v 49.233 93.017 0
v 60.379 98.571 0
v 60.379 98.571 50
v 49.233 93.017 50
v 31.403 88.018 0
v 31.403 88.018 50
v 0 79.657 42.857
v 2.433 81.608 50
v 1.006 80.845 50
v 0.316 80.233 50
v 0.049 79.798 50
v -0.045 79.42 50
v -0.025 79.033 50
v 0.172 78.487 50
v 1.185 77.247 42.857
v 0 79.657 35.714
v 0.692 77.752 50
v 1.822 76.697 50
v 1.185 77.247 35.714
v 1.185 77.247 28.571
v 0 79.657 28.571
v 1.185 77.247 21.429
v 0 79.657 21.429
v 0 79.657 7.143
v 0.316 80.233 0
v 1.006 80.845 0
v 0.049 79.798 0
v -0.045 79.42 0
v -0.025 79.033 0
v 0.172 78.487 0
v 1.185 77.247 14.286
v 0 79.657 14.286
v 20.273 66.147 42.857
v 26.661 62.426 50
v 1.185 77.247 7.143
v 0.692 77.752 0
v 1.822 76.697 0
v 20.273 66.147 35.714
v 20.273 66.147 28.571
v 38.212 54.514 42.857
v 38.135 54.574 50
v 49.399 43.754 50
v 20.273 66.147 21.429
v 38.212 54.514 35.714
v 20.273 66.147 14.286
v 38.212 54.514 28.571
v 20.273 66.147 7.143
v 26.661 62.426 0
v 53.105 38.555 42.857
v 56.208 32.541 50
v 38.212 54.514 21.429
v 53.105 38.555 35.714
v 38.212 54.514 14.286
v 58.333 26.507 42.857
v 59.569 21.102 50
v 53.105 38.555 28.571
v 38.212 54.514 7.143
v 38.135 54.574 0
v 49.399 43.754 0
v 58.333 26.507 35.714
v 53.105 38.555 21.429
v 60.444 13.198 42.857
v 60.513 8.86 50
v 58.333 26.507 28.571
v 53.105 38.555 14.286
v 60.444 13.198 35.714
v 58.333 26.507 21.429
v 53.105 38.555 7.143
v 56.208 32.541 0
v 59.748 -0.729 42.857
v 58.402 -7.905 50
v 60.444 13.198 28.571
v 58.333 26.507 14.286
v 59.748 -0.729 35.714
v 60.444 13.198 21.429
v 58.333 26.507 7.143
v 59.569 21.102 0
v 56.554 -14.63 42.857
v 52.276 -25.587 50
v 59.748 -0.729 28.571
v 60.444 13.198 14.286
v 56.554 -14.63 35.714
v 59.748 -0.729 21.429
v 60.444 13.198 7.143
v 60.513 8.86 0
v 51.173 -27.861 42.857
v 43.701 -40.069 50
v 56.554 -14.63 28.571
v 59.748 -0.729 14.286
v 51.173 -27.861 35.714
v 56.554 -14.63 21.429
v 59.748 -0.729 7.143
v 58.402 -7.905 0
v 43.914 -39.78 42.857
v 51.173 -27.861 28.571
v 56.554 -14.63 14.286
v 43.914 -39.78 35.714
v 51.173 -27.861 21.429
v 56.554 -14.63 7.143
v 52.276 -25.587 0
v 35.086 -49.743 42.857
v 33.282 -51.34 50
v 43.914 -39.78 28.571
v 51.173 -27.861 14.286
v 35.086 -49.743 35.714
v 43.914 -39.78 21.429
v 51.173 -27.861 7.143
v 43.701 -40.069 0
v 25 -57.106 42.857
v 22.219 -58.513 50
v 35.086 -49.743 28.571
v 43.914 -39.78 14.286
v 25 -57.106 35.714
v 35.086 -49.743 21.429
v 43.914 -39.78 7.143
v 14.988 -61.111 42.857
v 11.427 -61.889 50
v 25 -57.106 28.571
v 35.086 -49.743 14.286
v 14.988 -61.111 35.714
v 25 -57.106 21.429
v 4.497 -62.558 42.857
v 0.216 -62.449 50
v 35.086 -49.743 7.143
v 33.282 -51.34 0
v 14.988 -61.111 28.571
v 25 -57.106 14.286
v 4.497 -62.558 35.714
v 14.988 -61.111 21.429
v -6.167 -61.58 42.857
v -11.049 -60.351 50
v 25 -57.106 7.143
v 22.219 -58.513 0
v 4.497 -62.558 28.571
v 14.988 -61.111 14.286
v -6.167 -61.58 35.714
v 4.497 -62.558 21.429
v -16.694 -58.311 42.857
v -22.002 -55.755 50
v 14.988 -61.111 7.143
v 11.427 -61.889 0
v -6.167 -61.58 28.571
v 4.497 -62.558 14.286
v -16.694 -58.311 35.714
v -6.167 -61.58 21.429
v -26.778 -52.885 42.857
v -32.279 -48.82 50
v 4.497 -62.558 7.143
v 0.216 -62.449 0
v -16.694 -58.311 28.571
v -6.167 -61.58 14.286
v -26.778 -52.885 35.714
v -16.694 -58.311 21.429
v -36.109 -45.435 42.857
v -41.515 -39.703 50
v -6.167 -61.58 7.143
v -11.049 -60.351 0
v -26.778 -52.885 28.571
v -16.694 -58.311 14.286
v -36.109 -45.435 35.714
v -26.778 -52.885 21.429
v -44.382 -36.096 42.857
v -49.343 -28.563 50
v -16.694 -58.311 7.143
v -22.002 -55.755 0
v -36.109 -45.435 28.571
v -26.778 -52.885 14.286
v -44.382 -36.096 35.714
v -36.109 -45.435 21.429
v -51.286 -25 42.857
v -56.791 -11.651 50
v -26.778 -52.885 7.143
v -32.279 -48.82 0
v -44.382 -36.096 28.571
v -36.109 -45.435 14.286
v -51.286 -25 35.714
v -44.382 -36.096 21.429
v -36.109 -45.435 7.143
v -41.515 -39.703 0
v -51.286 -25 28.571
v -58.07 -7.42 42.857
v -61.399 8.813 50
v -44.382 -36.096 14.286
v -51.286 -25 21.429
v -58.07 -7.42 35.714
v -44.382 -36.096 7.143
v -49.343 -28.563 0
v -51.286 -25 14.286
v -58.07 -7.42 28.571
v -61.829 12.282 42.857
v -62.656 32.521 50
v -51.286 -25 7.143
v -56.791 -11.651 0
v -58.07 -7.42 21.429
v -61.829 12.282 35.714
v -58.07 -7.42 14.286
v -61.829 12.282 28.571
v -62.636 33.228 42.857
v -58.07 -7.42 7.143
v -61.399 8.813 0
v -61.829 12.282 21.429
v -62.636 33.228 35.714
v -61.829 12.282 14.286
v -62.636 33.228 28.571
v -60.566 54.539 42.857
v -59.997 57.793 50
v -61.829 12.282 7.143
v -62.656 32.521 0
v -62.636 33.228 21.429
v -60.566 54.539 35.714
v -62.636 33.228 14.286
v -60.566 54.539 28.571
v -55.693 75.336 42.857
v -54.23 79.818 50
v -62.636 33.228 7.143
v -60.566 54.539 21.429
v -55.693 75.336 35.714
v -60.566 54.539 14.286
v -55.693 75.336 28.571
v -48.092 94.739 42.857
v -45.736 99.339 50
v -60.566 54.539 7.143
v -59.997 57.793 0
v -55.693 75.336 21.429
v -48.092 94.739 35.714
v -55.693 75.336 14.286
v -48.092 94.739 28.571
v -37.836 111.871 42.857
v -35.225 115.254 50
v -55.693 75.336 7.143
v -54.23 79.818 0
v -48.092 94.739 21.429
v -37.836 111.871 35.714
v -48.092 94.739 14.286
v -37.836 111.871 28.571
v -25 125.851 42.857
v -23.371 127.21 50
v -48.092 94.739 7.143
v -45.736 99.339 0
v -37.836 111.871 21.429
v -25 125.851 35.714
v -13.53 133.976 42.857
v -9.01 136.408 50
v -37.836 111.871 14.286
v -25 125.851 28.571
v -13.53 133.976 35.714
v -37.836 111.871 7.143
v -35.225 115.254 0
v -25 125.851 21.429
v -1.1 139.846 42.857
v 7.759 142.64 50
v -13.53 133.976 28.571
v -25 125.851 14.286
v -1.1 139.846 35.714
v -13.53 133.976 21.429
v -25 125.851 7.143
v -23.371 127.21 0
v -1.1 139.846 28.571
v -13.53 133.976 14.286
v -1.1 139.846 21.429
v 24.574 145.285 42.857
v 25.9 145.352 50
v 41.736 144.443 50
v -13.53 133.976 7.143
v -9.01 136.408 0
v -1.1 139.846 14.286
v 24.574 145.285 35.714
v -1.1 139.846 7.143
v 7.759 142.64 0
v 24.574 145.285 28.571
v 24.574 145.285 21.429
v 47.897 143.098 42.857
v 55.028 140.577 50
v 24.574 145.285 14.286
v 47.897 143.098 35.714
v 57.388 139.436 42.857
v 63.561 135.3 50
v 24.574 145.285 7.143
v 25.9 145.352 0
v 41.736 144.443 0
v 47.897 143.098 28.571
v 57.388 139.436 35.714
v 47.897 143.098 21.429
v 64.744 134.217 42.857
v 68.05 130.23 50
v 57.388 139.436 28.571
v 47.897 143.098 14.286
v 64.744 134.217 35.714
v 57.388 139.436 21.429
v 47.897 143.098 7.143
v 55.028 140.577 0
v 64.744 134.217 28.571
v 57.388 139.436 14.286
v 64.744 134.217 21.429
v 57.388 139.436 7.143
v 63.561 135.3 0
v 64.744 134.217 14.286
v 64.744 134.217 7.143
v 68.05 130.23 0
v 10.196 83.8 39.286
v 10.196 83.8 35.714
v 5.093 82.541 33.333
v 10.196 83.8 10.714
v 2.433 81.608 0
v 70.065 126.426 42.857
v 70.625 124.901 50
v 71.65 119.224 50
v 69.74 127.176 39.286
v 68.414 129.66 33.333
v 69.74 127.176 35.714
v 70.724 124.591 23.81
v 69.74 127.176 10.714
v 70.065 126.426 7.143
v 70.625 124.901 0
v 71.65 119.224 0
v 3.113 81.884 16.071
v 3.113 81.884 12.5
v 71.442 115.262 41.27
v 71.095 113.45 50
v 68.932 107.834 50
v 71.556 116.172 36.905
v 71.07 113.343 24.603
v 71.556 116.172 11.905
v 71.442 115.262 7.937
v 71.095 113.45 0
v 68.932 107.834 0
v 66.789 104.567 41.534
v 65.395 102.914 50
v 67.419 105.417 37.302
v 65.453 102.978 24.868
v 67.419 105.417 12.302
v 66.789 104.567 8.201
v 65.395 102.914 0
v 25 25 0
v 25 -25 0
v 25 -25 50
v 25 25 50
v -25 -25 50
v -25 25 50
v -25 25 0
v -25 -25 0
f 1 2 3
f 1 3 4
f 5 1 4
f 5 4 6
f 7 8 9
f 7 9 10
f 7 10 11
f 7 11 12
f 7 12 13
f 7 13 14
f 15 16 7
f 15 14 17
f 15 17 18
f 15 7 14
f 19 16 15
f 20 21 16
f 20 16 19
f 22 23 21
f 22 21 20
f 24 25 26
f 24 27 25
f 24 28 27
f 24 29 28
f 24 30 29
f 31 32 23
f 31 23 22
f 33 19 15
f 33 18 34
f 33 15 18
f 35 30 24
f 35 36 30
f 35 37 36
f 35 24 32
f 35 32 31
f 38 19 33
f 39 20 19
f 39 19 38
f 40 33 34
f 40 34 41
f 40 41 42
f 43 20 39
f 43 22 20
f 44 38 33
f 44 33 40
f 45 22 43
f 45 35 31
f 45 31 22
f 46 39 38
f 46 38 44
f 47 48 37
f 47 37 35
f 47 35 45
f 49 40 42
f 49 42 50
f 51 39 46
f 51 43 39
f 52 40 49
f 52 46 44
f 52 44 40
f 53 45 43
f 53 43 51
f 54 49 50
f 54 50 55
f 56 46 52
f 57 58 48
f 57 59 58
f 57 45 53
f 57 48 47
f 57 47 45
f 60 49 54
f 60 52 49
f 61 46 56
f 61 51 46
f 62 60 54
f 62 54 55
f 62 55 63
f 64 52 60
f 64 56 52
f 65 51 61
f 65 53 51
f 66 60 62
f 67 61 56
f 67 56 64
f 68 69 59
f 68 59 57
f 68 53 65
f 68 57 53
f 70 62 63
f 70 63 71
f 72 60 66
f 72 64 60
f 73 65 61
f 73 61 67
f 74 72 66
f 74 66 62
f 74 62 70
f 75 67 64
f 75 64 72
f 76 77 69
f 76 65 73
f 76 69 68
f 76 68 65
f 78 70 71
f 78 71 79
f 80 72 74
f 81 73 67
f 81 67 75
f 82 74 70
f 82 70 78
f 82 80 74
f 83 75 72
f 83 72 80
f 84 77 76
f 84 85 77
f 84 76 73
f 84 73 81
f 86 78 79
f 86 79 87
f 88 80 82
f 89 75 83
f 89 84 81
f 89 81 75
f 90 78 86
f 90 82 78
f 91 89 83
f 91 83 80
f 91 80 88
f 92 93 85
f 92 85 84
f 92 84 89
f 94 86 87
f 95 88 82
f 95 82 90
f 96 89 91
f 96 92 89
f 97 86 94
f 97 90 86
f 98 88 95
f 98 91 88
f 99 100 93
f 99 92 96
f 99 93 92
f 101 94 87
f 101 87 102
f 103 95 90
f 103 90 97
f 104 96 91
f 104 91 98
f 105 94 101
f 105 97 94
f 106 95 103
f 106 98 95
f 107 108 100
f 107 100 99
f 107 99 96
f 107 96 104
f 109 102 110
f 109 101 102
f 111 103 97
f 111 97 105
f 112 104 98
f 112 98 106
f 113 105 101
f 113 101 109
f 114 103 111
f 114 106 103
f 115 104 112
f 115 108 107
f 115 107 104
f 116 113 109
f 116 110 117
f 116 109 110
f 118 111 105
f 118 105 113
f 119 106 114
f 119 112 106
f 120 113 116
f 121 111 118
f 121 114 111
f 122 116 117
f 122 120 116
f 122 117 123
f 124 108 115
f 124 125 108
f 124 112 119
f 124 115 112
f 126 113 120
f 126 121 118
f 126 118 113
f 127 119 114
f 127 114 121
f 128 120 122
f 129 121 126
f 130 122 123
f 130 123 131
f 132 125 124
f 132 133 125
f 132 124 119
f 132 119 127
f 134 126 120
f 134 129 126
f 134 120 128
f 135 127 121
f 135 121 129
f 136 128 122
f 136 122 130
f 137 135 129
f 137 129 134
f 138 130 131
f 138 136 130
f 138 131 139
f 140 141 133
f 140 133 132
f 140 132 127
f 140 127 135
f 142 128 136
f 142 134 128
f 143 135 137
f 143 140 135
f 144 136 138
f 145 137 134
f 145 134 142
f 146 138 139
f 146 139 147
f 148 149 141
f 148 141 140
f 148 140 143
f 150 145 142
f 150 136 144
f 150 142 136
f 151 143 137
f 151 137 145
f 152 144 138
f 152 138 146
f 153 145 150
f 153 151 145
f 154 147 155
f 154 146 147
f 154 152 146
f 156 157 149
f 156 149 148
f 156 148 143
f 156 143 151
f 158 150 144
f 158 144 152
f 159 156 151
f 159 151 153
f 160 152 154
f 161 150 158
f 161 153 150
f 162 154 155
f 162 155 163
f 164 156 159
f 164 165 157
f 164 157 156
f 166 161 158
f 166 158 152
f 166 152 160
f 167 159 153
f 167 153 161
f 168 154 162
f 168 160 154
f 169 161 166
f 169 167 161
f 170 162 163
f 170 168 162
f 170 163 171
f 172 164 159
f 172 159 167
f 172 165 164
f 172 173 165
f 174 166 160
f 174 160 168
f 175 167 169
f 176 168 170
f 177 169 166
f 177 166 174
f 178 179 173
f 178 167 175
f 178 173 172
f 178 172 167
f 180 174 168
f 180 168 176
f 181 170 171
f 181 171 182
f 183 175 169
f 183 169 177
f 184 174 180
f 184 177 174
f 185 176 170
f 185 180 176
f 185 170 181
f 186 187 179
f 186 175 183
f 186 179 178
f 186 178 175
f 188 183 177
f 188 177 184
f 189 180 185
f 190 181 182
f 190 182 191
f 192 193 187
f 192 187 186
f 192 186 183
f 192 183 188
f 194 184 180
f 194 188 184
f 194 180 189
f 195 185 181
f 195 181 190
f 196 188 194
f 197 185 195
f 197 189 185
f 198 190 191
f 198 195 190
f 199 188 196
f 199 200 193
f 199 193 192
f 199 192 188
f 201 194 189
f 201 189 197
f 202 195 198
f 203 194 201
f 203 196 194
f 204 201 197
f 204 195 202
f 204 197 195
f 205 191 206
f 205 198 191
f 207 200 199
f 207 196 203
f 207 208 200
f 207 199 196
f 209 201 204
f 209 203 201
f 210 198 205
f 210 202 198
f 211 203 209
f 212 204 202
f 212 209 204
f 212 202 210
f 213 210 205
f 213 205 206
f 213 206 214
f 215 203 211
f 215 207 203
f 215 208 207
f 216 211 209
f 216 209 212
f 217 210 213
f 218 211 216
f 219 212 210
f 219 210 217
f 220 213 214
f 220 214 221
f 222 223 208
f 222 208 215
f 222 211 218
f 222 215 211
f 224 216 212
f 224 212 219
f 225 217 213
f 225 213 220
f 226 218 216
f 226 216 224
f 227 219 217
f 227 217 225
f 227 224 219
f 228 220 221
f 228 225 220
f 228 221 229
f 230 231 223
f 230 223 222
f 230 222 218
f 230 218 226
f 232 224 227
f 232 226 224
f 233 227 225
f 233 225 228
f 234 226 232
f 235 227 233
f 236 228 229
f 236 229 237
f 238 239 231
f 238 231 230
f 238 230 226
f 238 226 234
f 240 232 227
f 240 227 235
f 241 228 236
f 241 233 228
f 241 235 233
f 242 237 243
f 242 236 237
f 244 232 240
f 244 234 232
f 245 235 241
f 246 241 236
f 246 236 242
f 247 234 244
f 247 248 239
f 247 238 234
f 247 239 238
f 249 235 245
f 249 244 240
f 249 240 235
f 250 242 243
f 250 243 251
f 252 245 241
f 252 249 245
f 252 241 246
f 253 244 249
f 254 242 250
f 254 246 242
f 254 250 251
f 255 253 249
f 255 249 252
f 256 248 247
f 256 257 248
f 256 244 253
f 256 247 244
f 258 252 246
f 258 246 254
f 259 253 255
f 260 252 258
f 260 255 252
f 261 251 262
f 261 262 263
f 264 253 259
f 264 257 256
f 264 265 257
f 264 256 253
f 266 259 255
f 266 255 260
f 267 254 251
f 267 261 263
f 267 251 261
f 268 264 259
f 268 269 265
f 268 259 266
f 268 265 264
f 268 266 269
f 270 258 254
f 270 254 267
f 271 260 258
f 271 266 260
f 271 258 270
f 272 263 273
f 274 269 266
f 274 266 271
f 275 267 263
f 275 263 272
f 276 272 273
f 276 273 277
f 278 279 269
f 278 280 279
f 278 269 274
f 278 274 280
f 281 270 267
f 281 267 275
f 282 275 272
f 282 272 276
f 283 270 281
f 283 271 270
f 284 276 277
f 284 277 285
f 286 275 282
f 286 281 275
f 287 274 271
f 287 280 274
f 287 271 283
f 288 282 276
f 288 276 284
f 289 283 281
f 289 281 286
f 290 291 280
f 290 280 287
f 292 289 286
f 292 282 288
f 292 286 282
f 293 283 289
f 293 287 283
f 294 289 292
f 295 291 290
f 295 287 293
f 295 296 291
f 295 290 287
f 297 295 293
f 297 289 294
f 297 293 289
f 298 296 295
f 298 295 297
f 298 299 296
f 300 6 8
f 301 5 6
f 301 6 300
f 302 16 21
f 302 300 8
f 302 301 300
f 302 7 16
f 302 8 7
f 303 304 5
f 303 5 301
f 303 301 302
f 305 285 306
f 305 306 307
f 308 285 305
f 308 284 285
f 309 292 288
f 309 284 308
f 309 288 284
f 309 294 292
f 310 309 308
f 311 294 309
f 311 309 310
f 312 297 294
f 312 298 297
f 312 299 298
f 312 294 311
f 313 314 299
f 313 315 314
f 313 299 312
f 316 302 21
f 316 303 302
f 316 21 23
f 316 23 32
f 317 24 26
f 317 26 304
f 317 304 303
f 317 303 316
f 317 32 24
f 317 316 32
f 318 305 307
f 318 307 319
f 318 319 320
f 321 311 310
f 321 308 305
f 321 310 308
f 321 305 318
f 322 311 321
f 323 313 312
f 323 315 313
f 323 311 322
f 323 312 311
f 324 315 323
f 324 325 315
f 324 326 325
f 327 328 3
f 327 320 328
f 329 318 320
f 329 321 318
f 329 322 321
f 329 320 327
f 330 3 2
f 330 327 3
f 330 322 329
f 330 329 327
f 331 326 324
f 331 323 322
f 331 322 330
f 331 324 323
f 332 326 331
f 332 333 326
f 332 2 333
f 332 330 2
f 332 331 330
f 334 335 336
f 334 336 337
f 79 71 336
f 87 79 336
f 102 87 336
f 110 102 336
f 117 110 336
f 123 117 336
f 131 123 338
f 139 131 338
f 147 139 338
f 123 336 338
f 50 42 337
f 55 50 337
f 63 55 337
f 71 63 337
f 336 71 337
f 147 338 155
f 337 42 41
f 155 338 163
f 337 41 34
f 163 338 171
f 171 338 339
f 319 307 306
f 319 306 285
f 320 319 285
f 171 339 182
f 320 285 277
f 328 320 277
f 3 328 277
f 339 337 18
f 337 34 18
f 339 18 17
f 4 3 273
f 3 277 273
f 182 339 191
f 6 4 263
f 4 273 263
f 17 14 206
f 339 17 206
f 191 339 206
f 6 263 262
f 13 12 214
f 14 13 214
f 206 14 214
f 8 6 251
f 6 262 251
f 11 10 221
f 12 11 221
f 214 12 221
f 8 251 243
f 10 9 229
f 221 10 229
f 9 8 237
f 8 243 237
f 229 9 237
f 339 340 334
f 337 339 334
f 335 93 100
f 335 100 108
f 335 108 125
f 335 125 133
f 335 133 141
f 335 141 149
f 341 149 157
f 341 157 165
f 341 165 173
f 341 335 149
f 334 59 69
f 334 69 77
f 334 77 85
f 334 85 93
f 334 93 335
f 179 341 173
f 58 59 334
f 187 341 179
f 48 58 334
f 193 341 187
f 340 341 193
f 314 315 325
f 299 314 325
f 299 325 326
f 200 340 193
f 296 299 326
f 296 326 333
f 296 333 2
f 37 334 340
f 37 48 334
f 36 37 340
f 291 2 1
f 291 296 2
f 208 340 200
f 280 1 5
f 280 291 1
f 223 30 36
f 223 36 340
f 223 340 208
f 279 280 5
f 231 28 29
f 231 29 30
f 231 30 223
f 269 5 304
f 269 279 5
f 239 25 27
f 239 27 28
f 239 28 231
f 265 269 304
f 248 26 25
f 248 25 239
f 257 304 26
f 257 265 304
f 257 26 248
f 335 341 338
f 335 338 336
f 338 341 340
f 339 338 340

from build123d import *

# Parameters (mm, degrees)
F0_W     = 50
F0_H     = 50
F1_DEPTH = 50
F2_DEPTH = 25


with BuildPart() as f1:
    # F0 (on Top) → F1 (new body)
    with BuildSketch(Plane.XY):
        with BuildLine():
            add(Edge.make_bspline(
                [(60.3792965412, 98.5710024834), (42.2060294349, 86.0096106651), (-40.1965644334, 84.4330607153), (86.3941165874, 49.8678062028), (36.7383600609, -87.2362112373), (-81.4714928529, -37.0813750778), (-54.2603331237, 151.3131611491), (76.5749348917, 149.7758383835), (74.0705953, 108.0344504811), (60.3792965412, 98.5710024834)],
                knots=[0, 0, 0, 0, 0.1260747515, 0.255957581, 0.4142199492, 0.5584144924, 0.7545437389, 0.9050183394, 1, 1, 1, 1], degree=3))
        make_face()
        Rectangle(F0_W, F0_H, mode=Mode.SUBTRACT)
    extrude(amount=F1_DEPTH)

    # F0 (on Top) → F2 (join)
    with BuildSketch(Plane.XY):
        with BuildLine():
            add(Edge.make_bspline(
                [(60.3792965412, 98.5710024834), (42.2060294349, 86.0096106651), (-40.1965644334, 84.4330607153), (86.3941165874, 49.8678062028), (36.7383600609, -87.2362112373), (-81.4714928529, -37.0813750778), (-54.2603331237, 151.3131611491), (76.5749348917, 149.7758383835), (74.0705953, 108.0344504811), (60.3792965412, 98.5710024834)],
                knots=[0, 0, 0, 0, 0.1260747515, 0.255957581, 0.4142199492, 0.5584144924, 0.7545437389, 0.9050183394, 1, 1, 1, 1], degree=3))
        make_face()
        Rectangle(F0_W, F0_H, mode=Mode.SUBTRACT)
    extrude(amount=F2_DEPTH)


solid = f1.part
